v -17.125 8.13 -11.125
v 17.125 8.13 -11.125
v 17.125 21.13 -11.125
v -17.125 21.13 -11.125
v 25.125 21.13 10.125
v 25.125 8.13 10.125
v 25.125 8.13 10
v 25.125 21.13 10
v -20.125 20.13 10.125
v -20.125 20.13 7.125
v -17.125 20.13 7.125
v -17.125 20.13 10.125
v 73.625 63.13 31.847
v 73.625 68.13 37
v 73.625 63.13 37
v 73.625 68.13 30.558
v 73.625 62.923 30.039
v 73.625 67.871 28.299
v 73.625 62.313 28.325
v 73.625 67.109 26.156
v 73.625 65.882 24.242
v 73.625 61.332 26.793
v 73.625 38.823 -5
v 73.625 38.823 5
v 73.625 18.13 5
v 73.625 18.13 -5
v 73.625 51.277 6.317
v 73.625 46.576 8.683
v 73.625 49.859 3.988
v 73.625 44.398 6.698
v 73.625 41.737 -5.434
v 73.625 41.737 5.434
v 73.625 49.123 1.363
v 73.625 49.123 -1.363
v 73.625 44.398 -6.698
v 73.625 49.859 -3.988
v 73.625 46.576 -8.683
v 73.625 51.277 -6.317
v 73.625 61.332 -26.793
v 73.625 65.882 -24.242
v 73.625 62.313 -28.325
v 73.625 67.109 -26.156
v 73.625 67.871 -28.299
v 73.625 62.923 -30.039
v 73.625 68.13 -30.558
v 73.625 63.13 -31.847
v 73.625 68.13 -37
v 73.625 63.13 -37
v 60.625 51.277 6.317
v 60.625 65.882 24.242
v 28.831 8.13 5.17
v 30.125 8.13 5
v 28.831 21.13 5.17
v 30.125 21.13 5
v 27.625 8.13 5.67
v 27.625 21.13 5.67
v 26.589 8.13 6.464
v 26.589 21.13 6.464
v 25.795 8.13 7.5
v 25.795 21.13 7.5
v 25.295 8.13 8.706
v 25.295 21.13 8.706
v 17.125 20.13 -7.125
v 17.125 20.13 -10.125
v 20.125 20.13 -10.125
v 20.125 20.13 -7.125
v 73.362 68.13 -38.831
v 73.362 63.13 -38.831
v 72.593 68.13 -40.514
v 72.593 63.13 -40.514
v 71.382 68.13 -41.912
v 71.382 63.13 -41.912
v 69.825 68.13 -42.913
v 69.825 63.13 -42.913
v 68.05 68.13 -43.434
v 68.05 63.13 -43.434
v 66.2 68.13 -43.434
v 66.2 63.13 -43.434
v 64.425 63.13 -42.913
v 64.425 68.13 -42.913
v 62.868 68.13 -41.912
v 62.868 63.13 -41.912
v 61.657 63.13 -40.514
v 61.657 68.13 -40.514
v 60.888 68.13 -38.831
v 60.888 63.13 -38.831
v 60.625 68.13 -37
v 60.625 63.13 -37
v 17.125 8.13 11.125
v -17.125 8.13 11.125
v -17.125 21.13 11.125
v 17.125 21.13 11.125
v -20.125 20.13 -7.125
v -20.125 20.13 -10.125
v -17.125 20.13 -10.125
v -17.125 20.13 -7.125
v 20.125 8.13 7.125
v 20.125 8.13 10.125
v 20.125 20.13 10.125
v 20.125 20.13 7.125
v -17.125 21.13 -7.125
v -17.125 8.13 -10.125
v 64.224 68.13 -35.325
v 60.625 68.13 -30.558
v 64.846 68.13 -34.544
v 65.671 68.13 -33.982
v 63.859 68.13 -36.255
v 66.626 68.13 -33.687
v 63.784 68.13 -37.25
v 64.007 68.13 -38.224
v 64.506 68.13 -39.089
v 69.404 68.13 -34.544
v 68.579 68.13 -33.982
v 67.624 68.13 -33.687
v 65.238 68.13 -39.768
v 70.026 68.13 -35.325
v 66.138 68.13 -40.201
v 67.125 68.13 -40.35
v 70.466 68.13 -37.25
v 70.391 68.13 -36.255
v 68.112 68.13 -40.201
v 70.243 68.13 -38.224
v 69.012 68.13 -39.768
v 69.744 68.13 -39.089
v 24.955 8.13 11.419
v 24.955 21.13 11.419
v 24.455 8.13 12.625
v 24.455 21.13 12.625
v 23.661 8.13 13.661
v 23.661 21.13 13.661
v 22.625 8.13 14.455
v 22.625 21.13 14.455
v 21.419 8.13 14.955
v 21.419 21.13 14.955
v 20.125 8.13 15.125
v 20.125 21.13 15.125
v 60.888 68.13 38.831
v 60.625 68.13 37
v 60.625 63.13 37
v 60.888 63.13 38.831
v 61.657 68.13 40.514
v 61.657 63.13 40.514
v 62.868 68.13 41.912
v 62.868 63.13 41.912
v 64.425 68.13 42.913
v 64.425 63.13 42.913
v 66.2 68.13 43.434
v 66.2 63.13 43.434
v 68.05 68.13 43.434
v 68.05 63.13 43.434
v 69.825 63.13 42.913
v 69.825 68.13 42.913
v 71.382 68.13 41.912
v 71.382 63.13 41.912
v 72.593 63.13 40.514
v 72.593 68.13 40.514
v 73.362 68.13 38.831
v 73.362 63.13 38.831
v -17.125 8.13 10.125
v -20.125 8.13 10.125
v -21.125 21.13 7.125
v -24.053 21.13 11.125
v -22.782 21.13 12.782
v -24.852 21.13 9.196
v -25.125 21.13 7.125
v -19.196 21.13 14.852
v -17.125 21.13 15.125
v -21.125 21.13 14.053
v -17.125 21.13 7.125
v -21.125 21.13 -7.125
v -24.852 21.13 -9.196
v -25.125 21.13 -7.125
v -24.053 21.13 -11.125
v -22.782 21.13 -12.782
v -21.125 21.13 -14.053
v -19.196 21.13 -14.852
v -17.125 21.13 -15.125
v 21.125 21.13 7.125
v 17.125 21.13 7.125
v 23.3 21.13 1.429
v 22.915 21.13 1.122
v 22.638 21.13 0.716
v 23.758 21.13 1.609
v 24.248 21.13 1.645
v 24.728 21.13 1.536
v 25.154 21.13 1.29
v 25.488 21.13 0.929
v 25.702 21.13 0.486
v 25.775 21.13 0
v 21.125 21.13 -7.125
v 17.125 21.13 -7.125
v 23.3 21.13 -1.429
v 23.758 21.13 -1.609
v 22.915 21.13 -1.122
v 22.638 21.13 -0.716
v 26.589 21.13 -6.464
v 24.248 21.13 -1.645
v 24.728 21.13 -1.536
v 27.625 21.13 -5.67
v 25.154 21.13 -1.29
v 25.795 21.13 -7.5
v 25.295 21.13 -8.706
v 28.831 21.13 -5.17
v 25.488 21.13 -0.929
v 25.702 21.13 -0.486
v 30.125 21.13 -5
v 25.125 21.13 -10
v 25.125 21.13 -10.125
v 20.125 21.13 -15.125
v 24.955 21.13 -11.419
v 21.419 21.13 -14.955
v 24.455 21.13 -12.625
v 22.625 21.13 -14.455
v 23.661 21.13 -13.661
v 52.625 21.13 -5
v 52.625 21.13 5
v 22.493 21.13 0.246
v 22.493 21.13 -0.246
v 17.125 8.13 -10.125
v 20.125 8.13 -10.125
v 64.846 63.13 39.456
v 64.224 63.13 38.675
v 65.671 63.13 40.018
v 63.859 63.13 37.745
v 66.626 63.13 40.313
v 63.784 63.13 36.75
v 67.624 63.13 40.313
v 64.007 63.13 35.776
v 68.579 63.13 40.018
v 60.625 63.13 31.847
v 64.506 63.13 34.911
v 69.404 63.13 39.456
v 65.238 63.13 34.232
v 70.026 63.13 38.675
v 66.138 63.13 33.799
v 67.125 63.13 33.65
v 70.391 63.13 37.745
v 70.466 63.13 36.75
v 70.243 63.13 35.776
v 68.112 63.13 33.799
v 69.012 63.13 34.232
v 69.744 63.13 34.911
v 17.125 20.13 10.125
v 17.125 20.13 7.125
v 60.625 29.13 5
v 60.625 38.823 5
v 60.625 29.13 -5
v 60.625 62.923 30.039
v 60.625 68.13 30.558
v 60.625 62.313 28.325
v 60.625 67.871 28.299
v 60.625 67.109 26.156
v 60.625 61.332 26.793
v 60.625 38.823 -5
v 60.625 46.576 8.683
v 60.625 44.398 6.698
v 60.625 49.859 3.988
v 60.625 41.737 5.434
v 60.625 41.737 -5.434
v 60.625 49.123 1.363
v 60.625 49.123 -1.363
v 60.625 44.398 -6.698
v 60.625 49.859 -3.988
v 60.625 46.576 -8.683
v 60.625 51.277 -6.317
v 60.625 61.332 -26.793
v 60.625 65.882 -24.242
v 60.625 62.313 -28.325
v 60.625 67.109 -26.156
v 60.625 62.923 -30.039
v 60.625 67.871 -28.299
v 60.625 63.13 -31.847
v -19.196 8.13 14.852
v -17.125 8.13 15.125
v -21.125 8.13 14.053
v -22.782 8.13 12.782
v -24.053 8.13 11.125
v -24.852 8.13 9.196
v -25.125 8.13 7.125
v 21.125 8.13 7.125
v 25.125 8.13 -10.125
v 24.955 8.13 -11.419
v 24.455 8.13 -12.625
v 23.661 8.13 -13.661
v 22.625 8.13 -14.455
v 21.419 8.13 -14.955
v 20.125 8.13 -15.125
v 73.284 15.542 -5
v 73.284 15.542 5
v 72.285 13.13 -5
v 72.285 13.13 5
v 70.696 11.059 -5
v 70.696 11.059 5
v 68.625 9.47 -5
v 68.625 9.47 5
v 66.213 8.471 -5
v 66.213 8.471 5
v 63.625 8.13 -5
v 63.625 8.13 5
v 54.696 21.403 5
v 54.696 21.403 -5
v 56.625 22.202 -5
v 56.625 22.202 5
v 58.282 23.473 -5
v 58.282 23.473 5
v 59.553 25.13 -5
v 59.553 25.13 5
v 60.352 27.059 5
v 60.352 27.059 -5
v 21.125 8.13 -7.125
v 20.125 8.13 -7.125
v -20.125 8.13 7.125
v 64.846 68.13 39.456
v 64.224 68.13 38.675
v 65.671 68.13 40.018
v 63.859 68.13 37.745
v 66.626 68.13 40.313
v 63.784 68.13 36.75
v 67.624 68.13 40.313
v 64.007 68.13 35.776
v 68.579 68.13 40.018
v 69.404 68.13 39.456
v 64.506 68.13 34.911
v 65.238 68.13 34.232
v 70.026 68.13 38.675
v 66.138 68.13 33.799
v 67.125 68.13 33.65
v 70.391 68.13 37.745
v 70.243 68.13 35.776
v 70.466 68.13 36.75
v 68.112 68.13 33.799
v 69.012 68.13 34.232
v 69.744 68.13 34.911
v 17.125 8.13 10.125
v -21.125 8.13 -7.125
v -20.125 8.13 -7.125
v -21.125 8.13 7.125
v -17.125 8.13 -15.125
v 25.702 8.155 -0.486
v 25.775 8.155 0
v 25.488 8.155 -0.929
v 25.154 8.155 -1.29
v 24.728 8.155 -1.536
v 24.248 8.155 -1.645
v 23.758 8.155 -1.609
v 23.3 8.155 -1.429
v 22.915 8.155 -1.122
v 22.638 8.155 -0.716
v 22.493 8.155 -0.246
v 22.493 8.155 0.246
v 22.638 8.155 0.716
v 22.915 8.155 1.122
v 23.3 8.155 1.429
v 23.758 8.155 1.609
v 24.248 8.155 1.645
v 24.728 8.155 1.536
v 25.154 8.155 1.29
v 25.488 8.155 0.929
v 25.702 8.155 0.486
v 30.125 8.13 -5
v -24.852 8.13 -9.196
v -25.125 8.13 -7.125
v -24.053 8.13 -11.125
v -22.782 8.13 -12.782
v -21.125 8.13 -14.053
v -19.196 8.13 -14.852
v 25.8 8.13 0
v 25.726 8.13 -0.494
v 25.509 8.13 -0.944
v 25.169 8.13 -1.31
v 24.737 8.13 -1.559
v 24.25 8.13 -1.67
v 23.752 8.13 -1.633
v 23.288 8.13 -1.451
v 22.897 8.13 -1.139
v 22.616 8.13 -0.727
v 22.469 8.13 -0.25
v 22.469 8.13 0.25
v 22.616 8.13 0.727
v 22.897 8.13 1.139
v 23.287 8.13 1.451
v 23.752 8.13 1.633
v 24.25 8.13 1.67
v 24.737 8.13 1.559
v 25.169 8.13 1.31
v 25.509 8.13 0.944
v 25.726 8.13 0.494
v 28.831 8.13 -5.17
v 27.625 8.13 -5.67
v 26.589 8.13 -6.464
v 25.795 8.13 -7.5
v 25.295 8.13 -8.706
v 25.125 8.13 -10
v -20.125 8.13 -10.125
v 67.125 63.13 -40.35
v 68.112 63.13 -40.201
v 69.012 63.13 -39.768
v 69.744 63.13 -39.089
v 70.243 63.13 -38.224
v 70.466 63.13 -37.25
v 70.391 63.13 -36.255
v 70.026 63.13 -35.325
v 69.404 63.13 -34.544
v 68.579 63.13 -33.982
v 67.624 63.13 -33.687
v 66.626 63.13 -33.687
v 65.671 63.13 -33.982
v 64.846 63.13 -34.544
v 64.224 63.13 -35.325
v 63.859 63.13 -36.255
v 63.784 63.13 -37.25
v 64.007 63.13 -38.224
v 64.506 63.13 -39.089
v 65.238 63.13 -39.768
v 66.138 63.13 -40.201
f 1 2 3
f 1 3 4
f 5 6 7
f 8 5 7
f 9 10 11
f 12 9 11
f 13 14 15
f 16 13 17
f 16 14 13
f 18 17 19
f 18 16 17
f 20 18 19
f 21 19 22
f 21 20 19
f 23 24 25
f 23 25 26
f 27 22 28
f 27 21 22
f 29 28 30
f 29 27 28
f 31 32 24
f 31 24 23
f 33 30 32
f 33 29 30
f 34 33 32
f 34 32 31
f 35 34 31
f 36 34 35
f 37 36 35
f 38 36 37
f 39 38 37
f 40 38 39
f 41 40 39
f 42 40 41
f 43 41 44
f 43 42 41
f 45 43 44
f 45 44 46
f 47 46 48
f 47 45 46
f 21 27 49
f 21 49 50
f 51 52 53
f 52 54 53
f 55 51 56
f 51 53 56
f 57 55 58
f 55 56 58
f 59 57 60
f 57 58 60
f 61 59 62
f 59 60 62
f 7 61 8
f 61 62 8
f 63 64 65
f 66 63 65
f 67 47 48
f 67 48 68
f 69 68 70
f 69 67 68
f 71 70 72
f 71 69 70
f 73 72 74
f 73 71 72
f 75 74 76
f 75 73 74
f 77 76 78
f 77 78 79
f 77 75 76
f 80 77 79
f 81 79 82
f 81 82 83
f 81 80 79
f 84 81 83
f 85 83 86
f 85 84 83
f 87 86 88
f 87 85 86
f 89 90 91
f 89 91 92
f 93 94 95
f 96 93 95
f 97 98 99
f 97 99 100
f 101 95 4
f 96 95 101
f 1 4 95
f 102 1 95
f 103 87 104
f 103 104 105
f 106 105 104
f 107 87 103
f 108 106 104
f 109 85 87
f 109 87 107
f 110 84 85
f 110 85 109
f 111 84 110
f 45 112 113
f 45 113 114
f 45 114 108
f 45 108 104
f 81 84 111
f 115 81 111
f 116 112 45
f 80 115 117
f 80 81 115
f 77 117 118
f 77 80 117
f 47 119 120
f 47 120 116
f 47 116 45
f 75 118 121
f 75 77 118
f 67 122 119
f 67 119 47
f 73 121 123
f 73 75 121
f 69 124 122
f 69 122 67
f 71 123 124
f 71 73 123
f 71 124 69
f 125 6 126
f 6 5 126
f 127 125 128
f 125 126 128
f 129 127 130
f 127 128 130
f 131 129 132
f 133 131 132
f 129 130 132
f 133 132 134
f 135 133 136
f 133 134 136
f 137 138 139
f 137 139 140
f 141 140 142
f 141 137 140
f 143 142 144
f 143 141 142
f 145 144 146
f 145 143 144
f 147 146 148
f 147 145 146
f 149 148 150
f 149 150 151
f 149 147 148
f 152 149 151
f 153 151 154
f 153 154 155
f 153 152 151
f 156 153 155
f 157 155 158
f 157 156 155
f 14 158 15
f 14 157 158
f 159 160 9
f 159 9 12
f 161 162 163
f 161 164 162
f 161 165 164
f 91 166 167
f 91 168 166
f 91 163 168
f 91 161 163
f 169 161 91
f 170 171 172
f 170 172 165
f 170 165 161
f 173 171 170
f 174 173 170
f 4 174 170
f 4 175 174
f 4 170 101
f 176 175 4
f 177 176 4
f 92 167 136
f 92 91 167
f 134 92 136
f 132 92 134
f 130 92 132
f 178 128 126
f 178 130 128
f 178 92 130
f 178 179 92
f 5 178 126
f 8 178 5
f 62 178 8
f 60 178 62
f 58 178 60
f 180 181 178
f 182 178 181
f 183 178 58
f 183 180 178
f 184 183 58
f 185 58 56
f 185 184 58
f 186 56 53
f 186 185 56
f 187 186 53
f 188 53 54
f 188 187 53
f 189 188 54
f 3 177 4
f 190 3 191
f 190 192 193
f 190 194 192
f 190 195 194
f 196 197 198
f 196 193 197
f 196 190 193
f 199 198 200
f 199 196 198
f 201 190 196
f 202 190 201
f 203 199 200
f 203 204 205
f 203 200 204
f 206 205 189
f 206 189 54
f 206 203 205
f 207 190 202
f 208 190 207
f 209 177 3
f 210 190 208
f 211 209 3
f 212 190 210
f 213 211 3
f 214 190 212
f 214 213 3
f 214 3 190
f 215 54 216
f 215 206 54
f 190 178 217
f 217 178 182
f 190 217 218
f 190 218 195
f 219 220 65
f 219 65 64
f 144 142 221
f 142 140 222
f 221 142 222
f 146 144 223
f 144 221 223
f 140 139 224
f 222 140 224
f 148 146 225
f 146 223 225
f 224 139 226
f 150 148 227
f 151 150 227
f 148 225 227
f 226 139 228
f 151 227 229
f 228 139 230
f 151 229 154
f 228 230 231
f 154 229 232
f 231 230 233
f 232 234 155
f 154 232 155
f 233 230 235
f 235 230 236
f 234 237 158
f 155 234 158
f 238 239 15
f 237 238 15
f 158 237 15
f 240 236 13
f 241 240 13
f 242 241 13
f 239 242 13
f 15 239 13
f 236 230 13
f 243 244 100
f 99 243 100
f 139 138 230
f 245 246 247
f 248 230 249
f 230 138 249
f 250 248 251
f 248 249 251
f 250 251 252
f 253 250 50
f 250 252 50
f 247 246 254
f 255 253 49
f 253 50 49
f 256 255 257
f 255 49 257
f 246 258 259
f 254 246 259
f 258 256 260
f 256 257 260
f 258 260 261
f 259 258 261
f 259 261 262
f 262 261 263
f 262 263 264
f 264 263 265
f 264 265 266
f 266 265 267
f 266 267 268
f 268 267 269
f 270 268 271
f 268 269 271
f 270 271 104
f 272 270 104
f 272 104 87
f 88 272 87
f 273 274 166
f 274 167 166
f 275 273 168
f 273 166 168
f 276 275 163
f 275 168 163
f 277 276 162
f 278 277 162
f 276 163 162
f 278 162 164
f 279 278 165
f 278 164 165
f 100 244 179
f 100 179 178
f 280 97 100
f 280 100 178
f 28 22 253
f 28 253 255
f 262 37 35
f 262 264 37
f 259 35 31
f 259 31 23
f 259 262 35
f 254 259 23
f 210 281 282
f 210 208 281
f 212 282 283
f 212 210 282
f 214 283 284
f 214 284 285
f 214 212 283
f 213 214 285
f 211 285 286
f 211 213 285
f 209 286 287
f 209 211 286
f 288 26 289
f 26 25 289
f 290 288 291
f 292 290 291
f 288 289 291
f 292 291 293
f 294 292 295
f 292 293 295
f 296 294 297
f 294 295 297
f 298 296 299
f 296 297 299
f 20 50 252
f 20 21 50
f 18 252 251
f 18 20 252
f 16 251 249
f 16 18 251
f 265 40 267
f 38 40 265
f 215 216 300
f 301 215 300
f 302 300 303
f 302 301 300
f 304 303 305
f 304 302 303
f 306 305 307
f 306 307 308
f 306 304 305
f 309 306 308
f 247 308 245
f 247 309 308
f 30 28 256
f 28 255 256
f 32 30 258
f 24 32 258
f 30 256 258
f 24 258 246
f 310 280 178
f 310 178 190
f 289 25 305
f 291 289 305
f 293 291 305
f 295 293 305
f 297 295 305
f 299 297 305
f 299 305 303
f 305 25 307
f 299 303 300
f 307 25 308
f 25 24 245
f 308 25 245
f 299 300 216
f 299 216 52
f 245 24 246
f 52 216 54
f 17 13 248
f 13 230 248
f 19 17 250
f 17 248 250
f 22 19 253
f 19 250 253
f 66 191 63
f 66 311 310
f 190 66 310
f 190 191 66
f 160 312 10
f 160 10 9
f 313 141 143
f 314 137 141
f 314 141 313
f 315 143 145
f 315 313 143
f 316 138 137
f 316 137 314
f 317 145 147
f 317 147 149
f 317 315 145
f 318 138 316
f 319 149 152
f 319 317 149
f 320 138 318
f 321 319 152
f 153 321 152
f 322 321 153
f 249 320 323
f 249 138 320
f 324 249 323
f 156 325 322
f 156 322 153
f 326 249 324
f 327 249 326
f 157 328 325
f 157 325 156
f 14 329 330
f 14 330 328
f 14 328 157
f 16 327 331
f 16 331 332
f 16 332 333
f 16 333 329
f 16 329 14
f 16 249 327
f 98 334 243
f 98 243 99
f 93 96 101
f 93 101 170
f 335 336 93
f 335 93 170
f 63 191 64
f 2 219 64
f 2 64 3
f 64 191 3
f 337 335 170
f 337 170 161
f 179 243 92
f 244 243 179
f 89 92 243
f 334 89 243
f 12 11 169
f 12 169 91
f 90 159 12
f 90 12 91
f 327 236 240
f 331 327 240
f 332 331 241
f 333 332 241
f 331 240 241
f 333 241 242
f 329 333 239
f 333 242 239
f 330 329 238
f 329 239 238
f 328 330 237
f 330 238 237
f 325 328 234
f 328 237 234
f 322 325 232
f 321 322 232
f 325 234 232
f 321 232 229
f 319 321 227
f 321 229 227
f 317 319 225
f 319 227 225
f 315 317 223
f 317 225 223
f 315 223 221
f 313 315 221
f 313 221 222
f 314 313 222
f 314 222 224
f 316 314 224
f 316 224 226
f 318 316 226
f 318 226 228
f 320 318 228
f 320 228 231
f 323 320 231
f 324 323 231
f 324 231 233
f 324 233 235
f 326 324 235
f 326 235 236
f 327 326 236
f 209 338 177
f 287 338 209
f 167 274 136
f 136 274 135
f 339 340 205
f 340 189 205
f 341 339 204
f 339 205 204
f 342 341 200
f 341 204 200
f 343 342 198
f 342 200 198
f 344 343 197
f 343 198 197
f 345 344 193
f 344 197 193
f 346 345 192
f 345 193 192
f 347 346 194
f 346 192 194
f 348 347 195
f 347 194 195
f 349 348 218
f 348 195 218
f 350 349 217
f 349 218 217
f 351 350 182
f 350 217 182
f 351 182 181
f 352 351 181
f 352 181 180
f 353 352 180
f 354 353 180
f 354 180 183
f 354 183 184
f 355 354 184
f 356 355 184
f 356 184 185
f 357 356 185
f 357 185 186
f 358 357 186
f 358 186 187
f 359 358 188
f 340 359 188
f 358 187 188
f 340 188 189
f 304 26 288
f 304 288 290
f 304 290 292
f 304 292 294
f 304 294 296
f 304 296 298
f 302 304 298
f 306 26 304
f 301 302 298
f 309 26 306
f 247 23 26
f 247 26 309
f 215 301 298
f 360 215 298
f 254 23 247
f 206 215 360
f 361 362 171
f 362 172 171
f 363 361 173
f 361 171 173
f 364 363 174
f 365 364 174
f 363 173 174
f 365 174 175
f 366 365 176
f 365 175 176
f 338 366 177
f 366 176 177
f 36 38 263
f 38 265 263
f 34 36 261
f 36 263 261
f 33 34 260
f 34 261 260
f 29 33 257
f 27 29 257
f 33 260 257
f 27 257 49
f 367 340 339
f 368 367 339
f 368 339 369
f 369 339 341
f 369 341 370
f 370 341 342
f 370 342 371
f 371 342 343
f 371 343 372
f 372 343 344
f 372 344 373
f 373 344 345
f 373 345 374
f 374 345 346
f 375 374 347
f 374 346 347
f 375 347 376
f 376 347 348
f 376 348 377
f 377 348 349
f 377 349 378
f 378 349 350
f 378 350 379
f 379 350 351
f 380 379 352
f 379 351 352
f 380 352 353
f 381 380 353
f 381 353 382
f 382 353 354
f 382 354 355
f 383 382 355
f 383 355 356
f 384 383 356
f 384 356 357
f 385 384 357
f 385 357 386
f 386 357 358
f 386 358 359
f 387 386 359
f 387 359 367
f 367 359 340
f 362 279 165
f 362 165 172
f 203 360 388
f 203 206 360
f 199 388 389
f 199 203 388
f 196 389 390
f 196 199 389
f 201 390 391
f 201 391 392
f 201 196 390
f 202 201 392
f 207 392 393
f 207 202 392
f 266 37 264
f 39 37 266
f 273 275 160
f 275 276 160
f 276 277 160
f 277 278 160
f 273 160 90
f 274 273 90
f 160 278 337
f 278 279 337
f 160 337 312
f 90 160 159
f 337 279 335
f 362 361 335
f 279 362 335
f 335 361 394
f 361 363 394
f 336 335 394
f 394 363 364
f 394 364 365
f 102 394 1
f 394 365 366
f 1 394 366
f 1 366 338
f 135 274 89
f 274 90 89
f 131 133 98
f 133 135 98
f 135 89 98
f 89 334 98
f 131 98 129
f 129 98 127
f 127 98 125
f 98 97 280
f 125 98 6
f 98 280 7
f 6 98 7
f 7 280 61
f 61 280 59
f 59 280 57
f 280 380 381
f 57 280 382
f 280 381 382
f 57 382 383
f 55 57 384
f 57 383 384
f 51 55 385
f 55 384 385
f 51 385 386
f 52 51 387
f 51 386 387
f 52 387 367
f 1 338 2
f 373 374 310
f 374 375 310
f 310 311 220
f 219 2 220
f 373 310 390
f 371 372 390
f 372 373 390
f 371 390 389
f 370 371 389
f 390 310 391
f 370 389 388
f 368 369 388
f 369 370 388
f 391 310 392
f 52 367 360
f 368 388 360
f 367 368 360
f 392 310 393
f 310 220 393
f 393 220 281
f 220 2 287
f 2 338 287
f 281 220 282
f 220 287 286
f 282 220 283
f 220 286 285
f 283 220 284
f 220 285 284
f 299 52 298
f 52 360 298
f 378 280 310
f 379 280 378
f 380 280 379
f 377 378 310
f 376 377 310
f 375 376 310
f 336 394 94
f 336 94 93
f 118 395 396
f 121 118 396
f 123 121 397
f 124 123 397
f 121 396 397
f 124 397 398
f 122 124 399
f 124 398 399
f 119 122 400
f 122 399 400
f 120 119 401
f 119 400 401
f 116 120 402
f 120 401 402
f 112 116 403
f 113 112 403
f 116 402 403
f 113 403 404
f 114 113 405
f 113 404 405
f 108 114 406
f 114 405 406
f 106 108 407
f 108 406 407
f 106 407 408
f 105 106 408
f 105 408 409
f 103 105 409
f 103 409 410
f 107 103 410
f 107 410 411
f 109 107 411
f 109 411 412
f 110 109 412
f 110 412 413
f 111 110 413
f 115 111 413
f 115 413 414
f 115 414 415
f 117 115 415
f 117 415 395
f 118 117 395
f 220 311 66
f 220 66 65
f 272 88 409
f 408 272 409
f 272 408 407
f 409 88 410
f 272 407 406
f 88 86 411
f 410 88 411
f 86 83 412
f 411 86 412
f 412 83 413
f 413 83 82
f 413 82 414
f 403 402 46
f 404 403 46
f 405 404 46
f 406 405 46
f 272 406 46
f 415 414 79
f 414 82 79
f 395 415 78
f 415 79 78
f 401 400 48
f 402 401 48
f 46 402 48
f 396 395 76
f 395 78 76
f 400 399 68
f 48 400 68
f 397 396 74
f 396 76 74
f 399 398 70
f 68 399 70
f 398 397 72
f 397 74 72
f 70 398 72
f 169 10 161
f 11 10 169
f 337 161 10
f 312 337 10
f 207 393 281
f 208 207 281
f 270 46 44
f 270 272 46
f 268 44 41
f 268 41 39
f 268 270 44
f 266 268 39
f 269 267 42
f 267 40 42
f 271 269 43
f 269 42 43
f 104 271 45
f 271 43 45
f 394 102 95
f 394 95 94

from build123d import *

# Parameters (mm, degrees)
BOSS_EXTRUDE1_DEPTH                   = 1
BOSS_EXTRUDE1_DEPTH_BACK              = 12
SKETCH1_W                             = 50.25
SKETCH1_H                             = 30.25
BOSS_EXTRUDE2_DEPTH                   = 5
BOSS_EXTRUDE3_DEPTH                   = 5
SKETCH4_R                             = 3.35
CUT_EXTRUDE1_DEPTH                    = 10
SKETCH6_W                             = 4
SKETCH6_H                             = 4
BOSS_EXTRUDE4_DEPTH                   = 1
TAP_DRILL_FOR_M4X0_7_TAP1_D           = 3.3
TAP_DRILL_FOR_M4X0_7_TAP1_CSINK_D     = 3.35
TAP_DRILL_FOR_M4X0_7_TAP1_CSINK_ANGLE = 90
SKETCH13_W                            = 13
SKETCH13_H                            = 54
CUT_EXTRUDE2_DEPTH                    = 22
BOSS_EXTRUDE5_DEPTH                   = 13
FILLET1_R                             = 10
FILLET2_R                             = 8
FILLET3_R                             = 5
FILLET4_R                             = 8


with BuildPart() as part:
    # Sketch1 → Boss-Extrude1 (new, two sides: drawn at the far end of the back side and taken through both)
    with BuildSketch(Plane(origin=(0, 20.13, 0), x_dir=(1, 0, 0), z_dir=(0, 1, 0)).offset(-BOSS_EXTRUDE1_DEPTH_BACK)):
        Rectangle(SKETCH1_W, SKETCH1_H)
        Polygon((20.125, 10.125), (17.125, 10.125), (17.125, 11.125), (-17.125, 11.125), (-17.125, 10.125), (-20.125, 10.125), (-20.125, 7.125), (-21.125, 7.125), (-21.125, -7.125), (-20.125, -7.125), (-20.125, -10.125), (-17.125, -10.125), (-17.125, -11.125), (17.125, -11.125), (17.125, -10.125), (20.125, -10.125), (20.125, -7.125), (21.125, -7.125), (21.125, 7.125), (20.125, 7.125), align=None, mode=Mode.SUBTRACT)
    extrude(amount=BOSS_EXTRUDE1_DEPTH + BOSS_EXTRUDE1_DEPTH_BACK)

    # Sketch2 → Boss-Extrude2 (add, symmetric)
    with BuildSketch(Plane.XY):
        Polygon((25.125, 21.13), (60.625, 21.13), (60.625, 68.13), (73.625, 68.13), (73.625, 8.13), (25.125, 8.13), align=None)
    extrude(amount=BOSS_EXTRUDE2_DEPTH, both=True)

    # Sketch3 → Boss-Extrude3 (add)
    with BuildSketch(Plane(origin=(0, 68.13, 0), x_dir=(1, 0, 0), z_dir=(0, 1, 0))):
        with BuildLine():
            Line((73.625, 5), (73.625, 37))
            ThreePointArc((73.625, 37), (67.125, 43.5), (60.625, 37))
            Line((60.625, 37), (60.625, 5))
            Line((60.625, 5), (73.625, 5))
        make_face()
        with BuildLine():
            Line((73.625, -37), (73.625, -5))
            Line((73.625, -5), (60.625, -5))
            Line((60.625, -5), (60.625, -37))
            ThreePointArc((60.625, -37), (67.125, -43.5), (73.625, -37))
        make_face()
    extrude(amount=-BOSS_EXTRUDE3_DEPTH)

    # Sketch4 → Cut-Extrude1 (cut)
    with BuildSketch(Plane.XZ.offset(-63.13)):
        with Locations(Location((67.125, 37, 0), (0, 0, 270))):
            Circle(SKETCH4_R)
        with Locations(Location((67.125, -37, 0), (0, 0, 270))):
            Circle(SKETCH4_R)
    extrude(amount=-CUT_EXTRUDE1_DEPTH, mode=Mode.SUBTRACT)

    # Sketch6 → Boss-Extrude4 (add)
    with BuildSketch(Plane(origin=(0, 21.13, 0), x_dir=(1, 0, 0), z_dir=(0, 1, 0))):
        with Locations((19.125, 9.125)):
            Rectangle(SKETCH6_W, SKETCH6_H)
        with Locations((19.125, -9.125)):
            Rectangle(SKETCH6_W, SKETCH6_H)
        with Locations((-19.125, -9.125)):
            Rectangle(SKETCH6_W, SKETCH6_H)
        with Locations((-19.125, 9.125)):
            Rectangle(SKETCH6_W, SKETCH6_H)
    extrude(amount=-BOSS_EXTRUDE4_DEPTH)

    # Tap Drill for M4x0.7 Tap1 (through all)
    with Locations(Plane(origin=(0, 8.13, 0), x_dir=(-1, 0, 0), z_dir=(0, -1, 0))):
        with Locations((-24.125, 0)):
            CounterSinkHole(TAP_DRILL_FOR_M4X0_7_TAP1_D / 2, TAP_DRILL_FOR_M4X0_7_TAP1_CSINK_D / 2, counter_sink_angle=TAP_DRILL_FOR_M4X0_7_TAP1_CSINK_ANGLE)

    # Sketch13 → Cut-Extrude2 (cut)
    with BuildSketch(Plane(origin=(0, 68.13, 0), x_dir=(1, 0, 0), z_dir=(0, 1, 0))):
        with Locations((67.125, 0)):
            Rectangle(SKETCH13_W, SKETCH13_H)
    extrude(amount=-CUT_EXTRUDE2_DEPTH, mode=Mode.SUBTRACT)


with BuildPart() as cut_extrude2_piece_1:
    # of the separate pieces the step leaves, piece 1, a body of its own (cut_extrude2_pieces)
    add(part.part.solids().sort_by_distance((25.125, 21.13, 15.125))[0])



with BuildPart() as cut_extrude2_piece_2:
    # of the separate pieces the step leaves, piece 2, a body of its own (cut_extrude2_pieces)
    add(part.part.solids().sort_by_distance((73.625, 68.13, 27))[0])


with BuildPart() as cut_extrude2_piece_3:
    # of the separate pieces the step leaves, piece 3, a body of its own (cut_extrude2_pieces)
    add(part.part.solids().sort_by_distance((73.625, 63.13, -27))[0])


with BuildPart() as cut_extrude2_piece_1_1:
    add(cut_extrude2_piece_1.part)

    add(cut_extrude2_piece_2.part)  # Boss-Extrude5 merges Cut-Extrude2 piece 2

    add(cut_extrude2_piece_3.part)  # Boss-Extrude5 merges Cut-Extrude2 piece 3
    # Sketch14 → Boss-Extrude5 (add)
    with BuildSketch(Plane(origin=(73.625, 0, 0), x_dir=(0, 0, -1), z_dir=(1, 0, 0))):
        Polygon((29, 63.13), (27, 63.13), (27, 68.13), (0, 46.13), (5, 46.13), (5, 43.574444444), align=None)
        Polygon((-5, 46.13), (0, 46.13), (-27, 68.13), (-27, 63.13), (-29, 63.13), (-5, 43.574444444), align=None)
    extrude(amount=-BOSS_EXTRUDE5_DEPTH)

    # Fillet1
    fillet1_edges = [cut_extrude2_piece_1_1.edges().sort_by_distance(p)[0] for p in [
        (73.625, 8.13, 0),
        (67.125, 43.574444444, -5),
        (67.125, 46.13, 0),
        (67.125, 68.13, -27),
        (67.125, 43.574444444, 5),
        (67.125, 68.13, 27),
    ]]
    fillet(fillet1_edges, radius=FILLET1_R)

    # Fillet2
    fillet2_edges = [cut_extrude2_piece_1_1.edges().sort_by_distance(p)[0] for p in [
        (67.125, 63.13, -29),
        (67.125, 63.13, 29),
    ]]
    fillet(fillet2_edges, radius=FILLET2_R)

    # Fillet3
    fillet3_edges = [cut_extrude2_piece_1_1.edges().sort_by_distance(p)[0] for p in [
        (25.125, 14.63, 5),
        (25.125, 14.63, 15.125),
        (25.125, 14.63, -5),
        (25.125, 14.63, -15.125),
    ]]
    fillet(fillet3_edges, radius=FILLET3_R)

    # Fillet4
    fillet4_edges = [cut_extrude2_piece_1_1.edges().sort_by_distance(p)[0] for p in [
        (60.625, 21.13, 0),
        (-25.125, 14.63, 15.125),
        (-25.125, 14.63, -15.125),
    ]]
    fillet(fillet4_edges, radius=FILLET4_R)


solid = cut_extrude2_piece_1_1.part
